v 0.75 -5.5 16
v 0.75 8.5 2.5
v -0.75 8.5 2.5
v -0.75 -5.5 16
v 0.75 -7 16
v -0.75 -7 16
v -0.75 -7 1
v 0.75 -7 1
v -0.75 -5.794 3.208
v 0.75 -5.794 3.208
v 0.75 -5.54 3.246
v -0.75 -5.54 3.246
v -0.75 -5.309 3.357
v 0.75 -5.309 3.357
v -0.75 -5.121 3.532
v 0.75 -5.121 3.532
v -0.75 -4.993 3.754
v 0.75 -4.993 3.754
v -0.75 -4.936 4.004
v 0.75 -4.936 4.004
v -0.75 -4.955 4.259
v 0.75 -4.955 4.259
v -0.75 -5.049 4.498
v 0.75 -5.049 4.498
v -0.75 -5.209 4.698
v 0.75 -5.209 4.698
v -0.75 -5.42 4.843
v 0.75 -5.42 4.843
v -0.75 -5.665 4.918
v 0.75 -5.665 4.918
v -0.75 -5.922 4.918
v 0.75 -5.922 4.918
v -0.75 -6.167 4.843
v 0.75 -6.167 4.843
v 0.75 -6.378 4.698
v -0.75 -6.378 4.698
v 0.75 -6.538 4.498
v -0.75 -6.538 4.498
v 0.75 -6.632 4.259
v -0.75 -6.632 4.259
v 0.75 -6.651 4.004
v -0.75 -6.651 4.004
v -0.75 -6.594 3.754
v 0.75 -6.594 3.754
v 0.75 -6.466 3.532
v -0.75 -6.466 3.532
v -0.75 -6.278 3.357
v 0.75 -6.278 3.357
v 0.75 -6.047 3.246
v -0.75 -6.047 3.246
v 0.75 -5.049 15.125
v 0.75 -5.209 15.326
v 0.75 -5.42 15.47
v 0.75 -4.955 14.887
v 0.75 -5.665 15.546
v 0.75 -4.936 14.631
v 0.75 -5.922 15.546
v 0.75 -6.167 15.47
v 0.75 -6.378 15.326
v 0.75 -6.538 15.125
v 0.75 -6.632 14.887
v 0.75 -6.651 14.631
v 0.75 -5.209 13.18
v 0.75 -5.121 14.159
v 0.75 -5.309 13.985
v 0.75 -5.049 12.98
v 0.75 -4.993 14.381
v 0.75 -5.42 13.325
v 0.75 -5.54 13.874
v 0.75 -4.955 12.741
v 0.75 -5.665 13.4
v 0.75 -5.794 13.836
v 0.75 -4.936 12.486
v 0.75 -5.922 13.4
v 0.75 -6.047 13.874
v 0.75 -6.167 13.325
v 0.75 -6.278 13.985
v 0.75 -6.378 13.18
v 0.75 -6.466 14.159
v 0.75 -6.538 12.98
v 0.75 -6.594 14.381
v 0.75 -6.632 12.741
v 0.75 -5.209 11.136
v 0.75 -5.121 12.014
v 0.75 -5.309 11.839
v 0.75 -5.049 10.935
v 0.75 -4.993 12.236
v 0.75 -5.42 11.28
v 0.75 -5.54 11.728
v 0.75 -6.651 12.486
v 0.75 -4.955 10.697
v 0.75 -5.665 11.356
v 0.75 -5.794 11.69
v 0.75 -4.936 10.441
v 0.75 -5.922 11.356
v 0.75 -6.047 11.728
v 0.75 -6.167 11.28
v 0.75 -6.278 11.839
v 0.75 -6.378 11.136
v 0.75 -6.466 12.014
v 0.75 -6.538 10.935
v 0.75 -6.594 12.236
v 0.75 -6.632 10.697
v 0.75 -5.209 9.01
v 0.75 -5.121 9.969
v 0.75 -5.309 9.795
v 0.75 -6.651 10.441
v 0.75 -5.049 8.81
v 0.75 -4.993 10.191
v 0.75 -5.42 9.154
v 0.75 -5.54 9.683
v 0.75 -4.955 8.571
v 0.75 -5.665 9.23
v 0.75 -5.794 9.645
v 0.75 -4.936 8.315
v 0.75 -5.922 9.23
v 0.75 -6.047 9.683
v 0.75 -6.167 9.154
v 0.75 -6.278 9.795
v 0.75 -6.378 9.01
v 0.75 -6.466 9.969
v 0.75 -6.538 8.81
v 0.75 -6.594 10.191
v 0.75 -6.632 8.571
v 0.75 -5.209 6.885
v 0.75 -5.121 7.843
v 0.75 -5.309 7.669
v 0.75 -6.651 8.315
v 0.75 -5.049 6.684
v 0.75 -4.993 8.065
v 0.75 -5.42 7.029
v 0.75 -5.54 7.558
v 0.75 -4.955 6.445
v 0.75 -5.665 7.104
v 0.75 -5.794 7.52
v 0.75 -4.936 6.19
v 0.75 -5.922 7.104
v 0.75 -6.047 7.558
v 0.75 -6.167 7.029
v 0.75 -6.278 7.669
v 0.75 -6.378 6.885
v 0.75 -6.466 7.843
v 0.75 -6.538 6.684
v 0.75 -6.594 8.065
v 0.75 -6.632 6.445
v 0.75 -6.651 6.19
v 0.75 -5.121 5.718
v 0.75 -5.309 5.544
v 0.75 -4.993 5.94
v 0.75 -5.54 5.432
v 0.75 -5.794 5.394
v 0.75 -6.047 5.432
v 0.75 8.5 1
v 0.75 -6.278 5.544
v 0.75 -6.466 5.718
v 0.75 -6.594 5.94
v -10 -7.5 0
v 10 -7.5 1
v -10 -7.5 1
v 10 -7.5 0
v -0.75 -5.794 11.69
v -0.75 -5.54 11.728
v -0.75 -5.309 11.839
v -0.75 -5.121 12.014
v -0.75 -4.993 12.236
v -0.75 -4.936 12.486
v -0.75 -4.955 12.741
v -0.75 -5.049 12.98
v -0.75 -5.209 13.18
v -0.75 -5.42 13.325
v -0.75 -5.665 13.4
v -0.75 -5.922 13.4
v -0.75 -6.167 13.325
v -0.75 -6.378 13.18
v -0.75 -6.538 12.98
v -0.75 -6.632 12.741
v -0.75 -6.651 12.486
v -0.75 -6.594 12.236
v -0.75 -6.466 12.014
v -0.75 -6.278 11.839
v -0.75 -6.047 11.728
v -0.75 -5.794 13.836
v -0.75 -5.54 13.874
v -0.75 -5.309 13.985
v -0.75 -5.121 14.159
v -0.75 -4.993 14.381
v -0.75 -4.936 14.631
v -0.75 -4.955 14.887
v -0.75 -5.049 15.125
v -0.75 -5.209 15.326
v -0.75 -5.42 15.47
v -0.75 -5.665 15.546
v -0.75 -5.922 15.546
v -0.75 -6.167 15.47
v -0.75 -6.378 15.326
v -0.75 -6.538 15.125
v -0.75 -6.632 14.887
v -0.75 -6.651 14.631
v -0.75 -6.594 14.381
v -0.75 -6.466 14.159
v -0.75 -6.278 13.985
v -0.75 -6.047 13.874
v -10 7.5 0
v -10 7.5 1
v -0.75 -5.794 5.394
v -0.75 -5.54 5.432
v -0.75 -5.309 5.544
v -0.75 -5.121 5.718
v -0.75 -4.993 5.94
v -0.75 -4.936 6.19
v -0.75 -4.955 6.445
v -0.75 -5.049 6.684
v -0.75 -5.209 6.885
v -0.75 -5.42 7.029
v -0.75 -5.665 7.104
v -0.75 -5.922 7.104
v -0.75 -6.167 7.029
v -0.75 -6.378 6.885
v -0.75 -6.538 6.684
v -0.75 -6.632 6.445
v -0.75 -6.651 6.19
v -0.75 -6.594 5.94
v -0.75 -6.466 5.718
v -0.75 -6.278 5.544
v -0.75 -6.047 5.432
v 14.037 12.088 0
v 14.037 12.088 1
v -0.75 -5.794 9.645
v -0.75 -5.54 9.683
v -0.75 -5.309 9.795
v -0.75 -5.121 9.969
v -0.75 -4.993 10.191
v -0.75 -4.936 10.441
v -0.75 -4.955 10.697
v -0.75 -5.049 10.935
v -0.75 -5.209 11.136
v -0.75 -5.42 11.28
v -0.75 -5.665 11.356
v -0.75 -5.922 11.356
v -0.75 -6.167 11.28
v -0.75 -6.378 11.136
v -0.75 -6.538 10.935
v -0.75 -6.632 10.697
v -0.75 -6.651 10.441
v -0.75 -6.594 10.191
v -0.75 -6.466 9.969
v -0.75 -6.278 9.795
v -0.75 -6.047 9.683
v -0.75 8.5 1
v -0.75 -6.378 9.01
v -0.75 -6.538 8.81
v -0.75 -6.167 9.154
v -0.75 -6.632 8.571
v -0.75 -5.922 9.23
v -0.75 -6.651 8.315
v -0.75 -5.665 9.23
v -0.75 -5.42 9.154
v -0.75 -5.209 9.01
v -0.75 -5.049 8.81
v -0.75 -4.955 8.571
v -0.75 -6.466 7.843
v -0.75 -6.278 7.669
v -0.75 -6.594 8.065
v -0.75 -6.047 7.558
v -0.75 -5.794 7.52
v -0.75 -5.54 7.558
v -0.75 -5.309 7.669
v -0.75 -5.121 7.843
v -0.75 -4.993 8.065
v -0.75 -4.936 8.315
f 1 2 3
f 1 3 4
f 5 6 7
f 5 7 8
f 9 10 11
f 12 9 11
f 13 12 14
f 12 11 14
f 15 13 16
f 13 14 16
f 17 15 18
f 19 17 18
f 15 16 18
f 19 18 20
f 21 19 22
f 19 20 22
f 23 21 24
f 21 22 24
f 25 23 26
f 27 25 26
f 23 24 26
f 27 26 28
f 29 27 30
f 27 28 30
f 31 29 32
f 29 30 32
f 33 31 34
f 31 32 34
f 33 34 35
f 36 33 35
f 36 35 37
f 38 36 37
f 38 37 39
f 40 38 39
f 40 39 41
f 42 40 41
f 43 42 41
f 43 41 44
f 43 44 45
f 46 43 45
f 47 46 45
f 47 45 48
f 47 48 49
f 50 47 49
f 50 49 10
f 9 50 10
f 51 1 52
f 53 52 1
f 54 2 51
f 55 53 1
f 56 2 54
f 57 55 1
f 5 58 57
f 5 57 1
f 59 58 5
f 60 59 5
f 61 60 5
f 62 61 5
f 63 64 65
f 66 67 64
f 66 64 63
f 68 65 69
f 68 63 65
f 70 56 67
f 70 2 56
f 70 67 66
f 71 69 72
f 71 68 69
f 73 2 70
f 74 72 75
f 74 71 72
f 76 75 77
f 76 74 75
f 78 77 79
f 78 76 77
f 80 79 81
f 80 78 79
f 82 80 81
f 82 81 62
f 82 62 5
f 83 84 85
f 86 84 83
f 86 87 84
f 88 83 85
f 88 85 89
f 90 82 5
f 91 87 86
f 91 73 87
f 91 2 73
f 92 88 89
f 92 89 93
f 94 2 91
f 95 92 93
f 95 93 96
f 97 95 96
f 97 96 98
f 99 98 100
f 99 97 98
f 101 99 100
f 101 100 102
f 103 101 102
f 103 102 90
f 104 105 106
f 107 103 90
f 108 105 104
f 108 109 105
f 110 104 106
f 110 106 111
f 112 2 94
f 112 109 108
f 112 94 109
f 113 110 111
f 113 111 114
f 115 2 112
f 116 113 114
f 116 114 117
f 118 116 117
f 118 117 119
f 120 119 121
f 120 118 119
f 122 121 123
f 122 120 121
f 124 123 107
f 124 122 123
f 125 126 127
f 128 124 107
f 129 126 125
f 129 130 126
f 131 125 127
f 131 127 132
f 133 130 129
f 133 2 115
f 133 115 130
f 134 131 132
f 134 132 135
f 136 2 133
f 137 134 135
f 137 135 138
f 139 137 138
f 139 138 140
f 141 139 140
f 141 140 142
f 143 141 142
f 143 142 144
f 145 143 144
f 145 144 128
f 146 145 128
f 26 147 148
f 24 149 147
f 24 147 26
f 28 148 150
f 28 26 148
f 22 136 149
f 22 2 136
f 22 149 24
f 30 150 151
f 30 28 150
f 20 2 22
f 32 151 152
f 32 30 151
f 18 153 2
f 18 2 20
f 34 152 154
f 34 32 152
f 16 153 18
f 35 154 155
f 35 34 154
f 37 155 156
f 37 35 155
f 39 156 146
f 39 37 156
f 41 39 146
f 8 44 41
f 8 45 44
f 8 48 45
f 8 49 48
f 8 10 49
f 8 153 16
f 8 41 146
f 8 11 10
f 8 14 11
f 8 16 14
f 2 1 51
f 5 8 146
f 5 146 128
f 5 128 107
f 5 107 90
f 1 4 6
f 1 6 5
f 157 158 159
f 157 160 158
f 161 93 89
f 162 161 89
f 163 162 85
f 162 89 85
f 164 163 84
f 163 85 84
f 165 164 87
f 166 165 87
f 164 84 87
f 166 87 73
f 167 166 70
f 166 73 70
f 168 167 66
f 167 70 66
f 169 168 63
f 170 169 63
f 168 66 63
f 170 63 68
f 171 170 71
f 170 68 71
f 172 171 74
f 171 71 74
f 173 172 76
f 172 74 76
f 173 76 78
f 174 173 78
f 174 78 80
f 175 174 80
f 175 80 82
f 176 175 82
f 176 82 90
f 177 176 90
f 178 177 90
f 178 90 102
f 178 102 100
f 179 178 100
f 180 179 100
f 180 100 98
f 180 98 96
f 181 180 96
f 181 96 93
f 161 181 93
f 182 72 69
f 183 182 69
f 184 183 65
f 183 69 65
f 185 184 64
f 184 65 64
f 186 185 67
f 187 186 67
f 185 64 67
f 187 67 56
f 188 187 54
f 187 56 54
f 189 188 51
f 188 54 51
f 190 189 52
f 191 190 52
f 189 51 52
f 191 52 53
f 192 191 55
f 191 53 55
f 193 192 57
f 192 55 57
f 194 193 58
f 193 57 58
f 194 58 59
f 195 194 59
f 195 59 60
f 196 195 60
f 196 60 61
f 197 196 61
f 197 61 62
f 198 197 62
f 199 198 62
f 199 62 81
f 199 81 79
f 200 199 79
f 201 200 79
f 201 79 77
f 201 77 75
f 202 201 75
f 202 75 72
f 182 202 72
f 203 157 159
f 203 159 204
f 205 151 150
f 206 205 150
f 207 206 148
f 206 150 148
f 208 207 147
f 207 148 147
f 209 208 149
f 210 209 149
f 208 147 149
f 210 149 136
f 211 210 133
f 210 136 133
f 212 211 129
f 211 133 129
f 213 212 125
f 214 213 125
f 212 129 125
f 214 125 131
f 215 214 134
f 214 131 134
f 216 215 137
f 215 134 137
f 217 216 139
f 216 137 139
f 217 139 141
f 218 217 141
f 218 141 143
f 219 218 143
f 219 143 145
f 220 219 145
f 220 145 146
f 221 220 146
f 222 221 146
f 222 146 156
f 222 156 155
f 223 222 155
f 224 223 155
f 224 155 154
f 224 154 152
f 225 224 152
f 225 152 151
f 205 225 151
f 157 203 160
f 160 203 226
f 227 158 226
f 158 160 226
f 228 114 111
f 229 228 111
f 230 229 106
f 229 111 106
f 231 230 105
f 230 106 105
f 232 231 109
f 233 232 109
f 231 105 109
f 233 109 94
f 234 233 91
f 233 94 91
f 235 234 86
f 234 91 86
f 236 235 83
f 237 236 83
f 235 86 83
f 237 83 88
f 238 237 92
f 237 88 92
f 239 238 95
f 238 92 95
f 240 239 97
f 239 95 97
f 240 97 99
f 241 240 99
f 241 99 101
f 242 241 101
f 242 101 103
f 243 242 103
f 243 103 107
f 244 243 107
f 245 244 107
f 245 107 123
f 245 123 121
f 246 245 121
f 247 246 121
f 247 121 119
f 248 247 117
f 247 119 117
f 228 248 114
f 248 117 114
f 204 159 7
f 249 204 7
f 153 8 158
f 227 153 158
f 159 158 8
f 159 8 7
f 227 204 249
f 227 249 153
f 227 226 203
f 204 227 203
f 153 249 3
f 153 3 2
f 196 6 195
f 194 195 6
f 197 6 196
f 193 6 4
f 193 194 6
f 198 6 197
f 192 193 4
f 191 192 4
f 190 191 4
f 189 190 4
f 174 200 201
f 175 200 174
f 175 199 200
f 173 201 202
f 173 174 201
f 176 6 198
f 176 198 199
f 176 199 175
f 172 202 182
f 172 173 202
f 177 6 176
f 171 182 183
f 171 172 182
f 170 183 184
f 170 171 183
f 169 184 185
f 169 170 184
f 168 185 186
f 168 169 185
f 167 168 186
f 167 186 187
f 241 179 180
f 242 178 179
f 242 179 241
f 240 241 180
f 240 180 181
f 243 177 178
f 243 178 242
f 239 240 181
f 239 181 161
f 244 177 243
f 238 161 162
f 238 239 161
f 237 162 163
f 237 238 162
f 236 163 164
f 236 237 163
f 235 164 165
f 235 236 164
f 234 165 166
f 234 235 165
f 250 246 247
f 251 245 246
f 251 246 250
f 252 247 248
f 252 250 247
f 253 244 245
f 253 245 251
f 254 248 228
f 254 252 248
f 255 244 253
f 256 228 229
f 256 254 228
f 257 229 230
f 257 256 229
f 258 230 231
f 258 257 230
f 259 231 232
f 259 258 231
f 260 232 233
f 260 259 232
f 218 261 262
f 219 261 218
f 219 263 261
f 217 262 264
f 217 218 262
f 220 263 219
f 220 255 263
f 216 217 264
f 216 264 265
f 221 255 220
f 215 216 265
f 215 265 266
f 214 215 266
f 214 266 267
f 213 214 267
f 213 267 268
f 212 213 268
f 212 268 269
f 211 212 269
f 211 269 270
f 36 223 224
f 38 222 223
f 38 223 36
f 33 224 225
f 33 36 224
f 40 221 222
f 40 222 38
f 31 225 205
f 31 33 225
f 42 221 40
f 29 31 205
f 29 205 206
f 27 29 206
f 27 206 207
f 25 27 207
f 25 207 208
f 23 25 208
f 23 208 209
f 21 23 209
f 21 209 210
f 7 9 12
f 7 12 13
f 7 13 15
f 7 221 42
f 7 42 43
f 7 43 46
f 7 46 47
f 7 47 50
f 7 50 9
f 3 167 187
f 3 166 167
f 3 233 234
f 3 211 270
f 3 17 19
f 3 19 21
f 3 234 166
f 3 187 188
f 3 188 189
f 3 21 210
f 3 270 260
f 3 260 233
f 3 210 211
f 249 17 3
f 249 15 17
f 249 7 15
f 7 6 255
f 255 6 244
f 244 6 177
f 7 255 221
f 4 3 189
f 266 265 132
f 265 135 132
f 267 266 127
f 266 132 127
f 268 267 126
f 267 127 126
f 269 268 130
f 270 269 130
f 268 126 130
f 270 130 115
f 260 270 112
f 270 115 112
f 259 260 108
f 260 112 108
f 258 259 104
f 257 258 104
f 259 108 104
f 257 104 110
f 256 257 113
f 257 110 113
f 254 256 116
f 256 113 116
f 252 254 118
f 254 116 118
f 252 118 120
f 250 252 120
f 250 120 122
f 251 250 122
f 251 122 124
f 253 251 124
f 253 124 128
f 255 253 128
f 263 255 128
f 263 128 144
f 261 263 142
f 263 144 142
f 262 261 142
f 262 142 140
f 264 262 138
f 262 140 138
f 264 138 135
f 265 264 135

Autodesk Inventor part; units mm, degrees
ref_plane "YZ Plane" through (0, 0, 0) normal (1, 0, 0) x (0, 1, 0)
ref_plane "XZ Plane" through (0, 0, 0) normal (0, 1, 0) x (-1, 0, 0)
ref_plane "XY Plane" through (0, 0, 0) normal (0, 0, 1) x (1, 0, 0)
sketch "Sketch1" plane through (0, 0, 0) normal (0, 0, 1) x (1, 0, 0)
  line L0 (12.5729, -9.5) -> (10, -7.5)
  line L1 (10, -7.5) -> (-10, -7.5)
  line L2 (-10, -7.5) -> (-10, 7.5)
  line L3 (10, -7.5) -> (14.037, 12.0883)
  line L4 (14.037, 12.0883) -> (-10, 7.5)
  point P0 (0, 0)
  point P1 (-10, 0)
  dimension "d0" = 20
  dimension "d1" = 15
  dimension "d2" = 20
  dimension "d3" = 101.645
  dimension "d18" = 10
  dimension "d19" = 10
  dimension "d20" = 0
extrude "Extrusion1" add sketch "Sketch1" along normal blind 1
sketch "Sketch2" plane through (0, 0, 1) normal (0, 0, 1) x (1, 0, 0)
  line L0 (0.75, 5) -> (0.75, -5)
  line L1 (-0.75, -5) -> (-0.75, 5)
  line L2 (-0.75, 5) -> (-0.75, 6.5)
  line L3 (0.75, 6.5) -> (0.75, 5)
  line L4 (-0.75, -5) -> (-0.75, -7)
  line L5 (-0.75, -7) -> (0.75, -7)
  line L6 (0.75, -7) -> (0.75, -5)
  line L7 (-0.75, 6.5) -> (-0.75, 8.5)
  line L8 (-0.75, 8.5) -> (0.75, 8.5)
  line L9 (0.75, 8.5) -> (0.75, 6.5)
  point P0 (0, 0)
  point P1 (0.75, 0)
  dimension "d7" = 10
  dimension "d8" = 1.5
  dimension "d12" = 1.5
  dimension "d21" = 2
  dimension "d22" = 2
extrude "Extrusion2" add sketch "Sketch2" along normal blind 15
sketch "Sketch5" plane through (0.75, -7, 1) normal (1, 0, 0) x (0, 0, -1)
  line L0 (0, 15.5) -> (0, 0) projected
  line L1 (0, 15.5) -> (-15, 15.5) projected
  line L2 (-15, 0) -> (-15, 15.5) projected
  line L3 (0, 0) -> (-15, 0) projected
  line L4 (-15, 0) -> (-15, 1.5)
  line L5 (0, 15.5) -> (-1.5, 15.5)
  line L6 (-1.5, 15.5) -> (-15, 1.5)
  line L7 (-15, 1.5) -> (-15, 15.5)
  line L8 (-15, 15.5) -> (-1.5, 15.5)
  point P0 (1, 7)
  dimension "d23" = 1.5
  dimension "d24" = 1.5
extrude "Extrusion4" cut sketch "Sketch5" against normal through all contours L6 L2 L1
sketch "Sketch6" plane through (0.75, -7, 1) normal (1, 0, 0) x (0, 0, -1)
  circle A0 centre (-13.6955, 1.2065) radius 0.86
  circle A1 centre (-11.5498, 1.2065) radius 0.86
  circle A2 centre (-9.5052, 1.2065) radius 0.86
  circle A3 centre (-7.3796, 1.2065) radius 0.86
  circle A4 centre (-5.2541, 1.2065) radius 0.86
  circle A5 centre (-3.0678, 1.2065) radius 0.86
  point P0 (1, 7)
  dimension "d27" = 1.72
  dimension "d28" = 1.72
  dimension "d29" = 1.72
  dimension "d30" = 1.72
  dimension "d31" = 1.72
  dimension "d32" = 1.72
extrude "Extrusion5" cut sketch "Sketch6" against normal through all
